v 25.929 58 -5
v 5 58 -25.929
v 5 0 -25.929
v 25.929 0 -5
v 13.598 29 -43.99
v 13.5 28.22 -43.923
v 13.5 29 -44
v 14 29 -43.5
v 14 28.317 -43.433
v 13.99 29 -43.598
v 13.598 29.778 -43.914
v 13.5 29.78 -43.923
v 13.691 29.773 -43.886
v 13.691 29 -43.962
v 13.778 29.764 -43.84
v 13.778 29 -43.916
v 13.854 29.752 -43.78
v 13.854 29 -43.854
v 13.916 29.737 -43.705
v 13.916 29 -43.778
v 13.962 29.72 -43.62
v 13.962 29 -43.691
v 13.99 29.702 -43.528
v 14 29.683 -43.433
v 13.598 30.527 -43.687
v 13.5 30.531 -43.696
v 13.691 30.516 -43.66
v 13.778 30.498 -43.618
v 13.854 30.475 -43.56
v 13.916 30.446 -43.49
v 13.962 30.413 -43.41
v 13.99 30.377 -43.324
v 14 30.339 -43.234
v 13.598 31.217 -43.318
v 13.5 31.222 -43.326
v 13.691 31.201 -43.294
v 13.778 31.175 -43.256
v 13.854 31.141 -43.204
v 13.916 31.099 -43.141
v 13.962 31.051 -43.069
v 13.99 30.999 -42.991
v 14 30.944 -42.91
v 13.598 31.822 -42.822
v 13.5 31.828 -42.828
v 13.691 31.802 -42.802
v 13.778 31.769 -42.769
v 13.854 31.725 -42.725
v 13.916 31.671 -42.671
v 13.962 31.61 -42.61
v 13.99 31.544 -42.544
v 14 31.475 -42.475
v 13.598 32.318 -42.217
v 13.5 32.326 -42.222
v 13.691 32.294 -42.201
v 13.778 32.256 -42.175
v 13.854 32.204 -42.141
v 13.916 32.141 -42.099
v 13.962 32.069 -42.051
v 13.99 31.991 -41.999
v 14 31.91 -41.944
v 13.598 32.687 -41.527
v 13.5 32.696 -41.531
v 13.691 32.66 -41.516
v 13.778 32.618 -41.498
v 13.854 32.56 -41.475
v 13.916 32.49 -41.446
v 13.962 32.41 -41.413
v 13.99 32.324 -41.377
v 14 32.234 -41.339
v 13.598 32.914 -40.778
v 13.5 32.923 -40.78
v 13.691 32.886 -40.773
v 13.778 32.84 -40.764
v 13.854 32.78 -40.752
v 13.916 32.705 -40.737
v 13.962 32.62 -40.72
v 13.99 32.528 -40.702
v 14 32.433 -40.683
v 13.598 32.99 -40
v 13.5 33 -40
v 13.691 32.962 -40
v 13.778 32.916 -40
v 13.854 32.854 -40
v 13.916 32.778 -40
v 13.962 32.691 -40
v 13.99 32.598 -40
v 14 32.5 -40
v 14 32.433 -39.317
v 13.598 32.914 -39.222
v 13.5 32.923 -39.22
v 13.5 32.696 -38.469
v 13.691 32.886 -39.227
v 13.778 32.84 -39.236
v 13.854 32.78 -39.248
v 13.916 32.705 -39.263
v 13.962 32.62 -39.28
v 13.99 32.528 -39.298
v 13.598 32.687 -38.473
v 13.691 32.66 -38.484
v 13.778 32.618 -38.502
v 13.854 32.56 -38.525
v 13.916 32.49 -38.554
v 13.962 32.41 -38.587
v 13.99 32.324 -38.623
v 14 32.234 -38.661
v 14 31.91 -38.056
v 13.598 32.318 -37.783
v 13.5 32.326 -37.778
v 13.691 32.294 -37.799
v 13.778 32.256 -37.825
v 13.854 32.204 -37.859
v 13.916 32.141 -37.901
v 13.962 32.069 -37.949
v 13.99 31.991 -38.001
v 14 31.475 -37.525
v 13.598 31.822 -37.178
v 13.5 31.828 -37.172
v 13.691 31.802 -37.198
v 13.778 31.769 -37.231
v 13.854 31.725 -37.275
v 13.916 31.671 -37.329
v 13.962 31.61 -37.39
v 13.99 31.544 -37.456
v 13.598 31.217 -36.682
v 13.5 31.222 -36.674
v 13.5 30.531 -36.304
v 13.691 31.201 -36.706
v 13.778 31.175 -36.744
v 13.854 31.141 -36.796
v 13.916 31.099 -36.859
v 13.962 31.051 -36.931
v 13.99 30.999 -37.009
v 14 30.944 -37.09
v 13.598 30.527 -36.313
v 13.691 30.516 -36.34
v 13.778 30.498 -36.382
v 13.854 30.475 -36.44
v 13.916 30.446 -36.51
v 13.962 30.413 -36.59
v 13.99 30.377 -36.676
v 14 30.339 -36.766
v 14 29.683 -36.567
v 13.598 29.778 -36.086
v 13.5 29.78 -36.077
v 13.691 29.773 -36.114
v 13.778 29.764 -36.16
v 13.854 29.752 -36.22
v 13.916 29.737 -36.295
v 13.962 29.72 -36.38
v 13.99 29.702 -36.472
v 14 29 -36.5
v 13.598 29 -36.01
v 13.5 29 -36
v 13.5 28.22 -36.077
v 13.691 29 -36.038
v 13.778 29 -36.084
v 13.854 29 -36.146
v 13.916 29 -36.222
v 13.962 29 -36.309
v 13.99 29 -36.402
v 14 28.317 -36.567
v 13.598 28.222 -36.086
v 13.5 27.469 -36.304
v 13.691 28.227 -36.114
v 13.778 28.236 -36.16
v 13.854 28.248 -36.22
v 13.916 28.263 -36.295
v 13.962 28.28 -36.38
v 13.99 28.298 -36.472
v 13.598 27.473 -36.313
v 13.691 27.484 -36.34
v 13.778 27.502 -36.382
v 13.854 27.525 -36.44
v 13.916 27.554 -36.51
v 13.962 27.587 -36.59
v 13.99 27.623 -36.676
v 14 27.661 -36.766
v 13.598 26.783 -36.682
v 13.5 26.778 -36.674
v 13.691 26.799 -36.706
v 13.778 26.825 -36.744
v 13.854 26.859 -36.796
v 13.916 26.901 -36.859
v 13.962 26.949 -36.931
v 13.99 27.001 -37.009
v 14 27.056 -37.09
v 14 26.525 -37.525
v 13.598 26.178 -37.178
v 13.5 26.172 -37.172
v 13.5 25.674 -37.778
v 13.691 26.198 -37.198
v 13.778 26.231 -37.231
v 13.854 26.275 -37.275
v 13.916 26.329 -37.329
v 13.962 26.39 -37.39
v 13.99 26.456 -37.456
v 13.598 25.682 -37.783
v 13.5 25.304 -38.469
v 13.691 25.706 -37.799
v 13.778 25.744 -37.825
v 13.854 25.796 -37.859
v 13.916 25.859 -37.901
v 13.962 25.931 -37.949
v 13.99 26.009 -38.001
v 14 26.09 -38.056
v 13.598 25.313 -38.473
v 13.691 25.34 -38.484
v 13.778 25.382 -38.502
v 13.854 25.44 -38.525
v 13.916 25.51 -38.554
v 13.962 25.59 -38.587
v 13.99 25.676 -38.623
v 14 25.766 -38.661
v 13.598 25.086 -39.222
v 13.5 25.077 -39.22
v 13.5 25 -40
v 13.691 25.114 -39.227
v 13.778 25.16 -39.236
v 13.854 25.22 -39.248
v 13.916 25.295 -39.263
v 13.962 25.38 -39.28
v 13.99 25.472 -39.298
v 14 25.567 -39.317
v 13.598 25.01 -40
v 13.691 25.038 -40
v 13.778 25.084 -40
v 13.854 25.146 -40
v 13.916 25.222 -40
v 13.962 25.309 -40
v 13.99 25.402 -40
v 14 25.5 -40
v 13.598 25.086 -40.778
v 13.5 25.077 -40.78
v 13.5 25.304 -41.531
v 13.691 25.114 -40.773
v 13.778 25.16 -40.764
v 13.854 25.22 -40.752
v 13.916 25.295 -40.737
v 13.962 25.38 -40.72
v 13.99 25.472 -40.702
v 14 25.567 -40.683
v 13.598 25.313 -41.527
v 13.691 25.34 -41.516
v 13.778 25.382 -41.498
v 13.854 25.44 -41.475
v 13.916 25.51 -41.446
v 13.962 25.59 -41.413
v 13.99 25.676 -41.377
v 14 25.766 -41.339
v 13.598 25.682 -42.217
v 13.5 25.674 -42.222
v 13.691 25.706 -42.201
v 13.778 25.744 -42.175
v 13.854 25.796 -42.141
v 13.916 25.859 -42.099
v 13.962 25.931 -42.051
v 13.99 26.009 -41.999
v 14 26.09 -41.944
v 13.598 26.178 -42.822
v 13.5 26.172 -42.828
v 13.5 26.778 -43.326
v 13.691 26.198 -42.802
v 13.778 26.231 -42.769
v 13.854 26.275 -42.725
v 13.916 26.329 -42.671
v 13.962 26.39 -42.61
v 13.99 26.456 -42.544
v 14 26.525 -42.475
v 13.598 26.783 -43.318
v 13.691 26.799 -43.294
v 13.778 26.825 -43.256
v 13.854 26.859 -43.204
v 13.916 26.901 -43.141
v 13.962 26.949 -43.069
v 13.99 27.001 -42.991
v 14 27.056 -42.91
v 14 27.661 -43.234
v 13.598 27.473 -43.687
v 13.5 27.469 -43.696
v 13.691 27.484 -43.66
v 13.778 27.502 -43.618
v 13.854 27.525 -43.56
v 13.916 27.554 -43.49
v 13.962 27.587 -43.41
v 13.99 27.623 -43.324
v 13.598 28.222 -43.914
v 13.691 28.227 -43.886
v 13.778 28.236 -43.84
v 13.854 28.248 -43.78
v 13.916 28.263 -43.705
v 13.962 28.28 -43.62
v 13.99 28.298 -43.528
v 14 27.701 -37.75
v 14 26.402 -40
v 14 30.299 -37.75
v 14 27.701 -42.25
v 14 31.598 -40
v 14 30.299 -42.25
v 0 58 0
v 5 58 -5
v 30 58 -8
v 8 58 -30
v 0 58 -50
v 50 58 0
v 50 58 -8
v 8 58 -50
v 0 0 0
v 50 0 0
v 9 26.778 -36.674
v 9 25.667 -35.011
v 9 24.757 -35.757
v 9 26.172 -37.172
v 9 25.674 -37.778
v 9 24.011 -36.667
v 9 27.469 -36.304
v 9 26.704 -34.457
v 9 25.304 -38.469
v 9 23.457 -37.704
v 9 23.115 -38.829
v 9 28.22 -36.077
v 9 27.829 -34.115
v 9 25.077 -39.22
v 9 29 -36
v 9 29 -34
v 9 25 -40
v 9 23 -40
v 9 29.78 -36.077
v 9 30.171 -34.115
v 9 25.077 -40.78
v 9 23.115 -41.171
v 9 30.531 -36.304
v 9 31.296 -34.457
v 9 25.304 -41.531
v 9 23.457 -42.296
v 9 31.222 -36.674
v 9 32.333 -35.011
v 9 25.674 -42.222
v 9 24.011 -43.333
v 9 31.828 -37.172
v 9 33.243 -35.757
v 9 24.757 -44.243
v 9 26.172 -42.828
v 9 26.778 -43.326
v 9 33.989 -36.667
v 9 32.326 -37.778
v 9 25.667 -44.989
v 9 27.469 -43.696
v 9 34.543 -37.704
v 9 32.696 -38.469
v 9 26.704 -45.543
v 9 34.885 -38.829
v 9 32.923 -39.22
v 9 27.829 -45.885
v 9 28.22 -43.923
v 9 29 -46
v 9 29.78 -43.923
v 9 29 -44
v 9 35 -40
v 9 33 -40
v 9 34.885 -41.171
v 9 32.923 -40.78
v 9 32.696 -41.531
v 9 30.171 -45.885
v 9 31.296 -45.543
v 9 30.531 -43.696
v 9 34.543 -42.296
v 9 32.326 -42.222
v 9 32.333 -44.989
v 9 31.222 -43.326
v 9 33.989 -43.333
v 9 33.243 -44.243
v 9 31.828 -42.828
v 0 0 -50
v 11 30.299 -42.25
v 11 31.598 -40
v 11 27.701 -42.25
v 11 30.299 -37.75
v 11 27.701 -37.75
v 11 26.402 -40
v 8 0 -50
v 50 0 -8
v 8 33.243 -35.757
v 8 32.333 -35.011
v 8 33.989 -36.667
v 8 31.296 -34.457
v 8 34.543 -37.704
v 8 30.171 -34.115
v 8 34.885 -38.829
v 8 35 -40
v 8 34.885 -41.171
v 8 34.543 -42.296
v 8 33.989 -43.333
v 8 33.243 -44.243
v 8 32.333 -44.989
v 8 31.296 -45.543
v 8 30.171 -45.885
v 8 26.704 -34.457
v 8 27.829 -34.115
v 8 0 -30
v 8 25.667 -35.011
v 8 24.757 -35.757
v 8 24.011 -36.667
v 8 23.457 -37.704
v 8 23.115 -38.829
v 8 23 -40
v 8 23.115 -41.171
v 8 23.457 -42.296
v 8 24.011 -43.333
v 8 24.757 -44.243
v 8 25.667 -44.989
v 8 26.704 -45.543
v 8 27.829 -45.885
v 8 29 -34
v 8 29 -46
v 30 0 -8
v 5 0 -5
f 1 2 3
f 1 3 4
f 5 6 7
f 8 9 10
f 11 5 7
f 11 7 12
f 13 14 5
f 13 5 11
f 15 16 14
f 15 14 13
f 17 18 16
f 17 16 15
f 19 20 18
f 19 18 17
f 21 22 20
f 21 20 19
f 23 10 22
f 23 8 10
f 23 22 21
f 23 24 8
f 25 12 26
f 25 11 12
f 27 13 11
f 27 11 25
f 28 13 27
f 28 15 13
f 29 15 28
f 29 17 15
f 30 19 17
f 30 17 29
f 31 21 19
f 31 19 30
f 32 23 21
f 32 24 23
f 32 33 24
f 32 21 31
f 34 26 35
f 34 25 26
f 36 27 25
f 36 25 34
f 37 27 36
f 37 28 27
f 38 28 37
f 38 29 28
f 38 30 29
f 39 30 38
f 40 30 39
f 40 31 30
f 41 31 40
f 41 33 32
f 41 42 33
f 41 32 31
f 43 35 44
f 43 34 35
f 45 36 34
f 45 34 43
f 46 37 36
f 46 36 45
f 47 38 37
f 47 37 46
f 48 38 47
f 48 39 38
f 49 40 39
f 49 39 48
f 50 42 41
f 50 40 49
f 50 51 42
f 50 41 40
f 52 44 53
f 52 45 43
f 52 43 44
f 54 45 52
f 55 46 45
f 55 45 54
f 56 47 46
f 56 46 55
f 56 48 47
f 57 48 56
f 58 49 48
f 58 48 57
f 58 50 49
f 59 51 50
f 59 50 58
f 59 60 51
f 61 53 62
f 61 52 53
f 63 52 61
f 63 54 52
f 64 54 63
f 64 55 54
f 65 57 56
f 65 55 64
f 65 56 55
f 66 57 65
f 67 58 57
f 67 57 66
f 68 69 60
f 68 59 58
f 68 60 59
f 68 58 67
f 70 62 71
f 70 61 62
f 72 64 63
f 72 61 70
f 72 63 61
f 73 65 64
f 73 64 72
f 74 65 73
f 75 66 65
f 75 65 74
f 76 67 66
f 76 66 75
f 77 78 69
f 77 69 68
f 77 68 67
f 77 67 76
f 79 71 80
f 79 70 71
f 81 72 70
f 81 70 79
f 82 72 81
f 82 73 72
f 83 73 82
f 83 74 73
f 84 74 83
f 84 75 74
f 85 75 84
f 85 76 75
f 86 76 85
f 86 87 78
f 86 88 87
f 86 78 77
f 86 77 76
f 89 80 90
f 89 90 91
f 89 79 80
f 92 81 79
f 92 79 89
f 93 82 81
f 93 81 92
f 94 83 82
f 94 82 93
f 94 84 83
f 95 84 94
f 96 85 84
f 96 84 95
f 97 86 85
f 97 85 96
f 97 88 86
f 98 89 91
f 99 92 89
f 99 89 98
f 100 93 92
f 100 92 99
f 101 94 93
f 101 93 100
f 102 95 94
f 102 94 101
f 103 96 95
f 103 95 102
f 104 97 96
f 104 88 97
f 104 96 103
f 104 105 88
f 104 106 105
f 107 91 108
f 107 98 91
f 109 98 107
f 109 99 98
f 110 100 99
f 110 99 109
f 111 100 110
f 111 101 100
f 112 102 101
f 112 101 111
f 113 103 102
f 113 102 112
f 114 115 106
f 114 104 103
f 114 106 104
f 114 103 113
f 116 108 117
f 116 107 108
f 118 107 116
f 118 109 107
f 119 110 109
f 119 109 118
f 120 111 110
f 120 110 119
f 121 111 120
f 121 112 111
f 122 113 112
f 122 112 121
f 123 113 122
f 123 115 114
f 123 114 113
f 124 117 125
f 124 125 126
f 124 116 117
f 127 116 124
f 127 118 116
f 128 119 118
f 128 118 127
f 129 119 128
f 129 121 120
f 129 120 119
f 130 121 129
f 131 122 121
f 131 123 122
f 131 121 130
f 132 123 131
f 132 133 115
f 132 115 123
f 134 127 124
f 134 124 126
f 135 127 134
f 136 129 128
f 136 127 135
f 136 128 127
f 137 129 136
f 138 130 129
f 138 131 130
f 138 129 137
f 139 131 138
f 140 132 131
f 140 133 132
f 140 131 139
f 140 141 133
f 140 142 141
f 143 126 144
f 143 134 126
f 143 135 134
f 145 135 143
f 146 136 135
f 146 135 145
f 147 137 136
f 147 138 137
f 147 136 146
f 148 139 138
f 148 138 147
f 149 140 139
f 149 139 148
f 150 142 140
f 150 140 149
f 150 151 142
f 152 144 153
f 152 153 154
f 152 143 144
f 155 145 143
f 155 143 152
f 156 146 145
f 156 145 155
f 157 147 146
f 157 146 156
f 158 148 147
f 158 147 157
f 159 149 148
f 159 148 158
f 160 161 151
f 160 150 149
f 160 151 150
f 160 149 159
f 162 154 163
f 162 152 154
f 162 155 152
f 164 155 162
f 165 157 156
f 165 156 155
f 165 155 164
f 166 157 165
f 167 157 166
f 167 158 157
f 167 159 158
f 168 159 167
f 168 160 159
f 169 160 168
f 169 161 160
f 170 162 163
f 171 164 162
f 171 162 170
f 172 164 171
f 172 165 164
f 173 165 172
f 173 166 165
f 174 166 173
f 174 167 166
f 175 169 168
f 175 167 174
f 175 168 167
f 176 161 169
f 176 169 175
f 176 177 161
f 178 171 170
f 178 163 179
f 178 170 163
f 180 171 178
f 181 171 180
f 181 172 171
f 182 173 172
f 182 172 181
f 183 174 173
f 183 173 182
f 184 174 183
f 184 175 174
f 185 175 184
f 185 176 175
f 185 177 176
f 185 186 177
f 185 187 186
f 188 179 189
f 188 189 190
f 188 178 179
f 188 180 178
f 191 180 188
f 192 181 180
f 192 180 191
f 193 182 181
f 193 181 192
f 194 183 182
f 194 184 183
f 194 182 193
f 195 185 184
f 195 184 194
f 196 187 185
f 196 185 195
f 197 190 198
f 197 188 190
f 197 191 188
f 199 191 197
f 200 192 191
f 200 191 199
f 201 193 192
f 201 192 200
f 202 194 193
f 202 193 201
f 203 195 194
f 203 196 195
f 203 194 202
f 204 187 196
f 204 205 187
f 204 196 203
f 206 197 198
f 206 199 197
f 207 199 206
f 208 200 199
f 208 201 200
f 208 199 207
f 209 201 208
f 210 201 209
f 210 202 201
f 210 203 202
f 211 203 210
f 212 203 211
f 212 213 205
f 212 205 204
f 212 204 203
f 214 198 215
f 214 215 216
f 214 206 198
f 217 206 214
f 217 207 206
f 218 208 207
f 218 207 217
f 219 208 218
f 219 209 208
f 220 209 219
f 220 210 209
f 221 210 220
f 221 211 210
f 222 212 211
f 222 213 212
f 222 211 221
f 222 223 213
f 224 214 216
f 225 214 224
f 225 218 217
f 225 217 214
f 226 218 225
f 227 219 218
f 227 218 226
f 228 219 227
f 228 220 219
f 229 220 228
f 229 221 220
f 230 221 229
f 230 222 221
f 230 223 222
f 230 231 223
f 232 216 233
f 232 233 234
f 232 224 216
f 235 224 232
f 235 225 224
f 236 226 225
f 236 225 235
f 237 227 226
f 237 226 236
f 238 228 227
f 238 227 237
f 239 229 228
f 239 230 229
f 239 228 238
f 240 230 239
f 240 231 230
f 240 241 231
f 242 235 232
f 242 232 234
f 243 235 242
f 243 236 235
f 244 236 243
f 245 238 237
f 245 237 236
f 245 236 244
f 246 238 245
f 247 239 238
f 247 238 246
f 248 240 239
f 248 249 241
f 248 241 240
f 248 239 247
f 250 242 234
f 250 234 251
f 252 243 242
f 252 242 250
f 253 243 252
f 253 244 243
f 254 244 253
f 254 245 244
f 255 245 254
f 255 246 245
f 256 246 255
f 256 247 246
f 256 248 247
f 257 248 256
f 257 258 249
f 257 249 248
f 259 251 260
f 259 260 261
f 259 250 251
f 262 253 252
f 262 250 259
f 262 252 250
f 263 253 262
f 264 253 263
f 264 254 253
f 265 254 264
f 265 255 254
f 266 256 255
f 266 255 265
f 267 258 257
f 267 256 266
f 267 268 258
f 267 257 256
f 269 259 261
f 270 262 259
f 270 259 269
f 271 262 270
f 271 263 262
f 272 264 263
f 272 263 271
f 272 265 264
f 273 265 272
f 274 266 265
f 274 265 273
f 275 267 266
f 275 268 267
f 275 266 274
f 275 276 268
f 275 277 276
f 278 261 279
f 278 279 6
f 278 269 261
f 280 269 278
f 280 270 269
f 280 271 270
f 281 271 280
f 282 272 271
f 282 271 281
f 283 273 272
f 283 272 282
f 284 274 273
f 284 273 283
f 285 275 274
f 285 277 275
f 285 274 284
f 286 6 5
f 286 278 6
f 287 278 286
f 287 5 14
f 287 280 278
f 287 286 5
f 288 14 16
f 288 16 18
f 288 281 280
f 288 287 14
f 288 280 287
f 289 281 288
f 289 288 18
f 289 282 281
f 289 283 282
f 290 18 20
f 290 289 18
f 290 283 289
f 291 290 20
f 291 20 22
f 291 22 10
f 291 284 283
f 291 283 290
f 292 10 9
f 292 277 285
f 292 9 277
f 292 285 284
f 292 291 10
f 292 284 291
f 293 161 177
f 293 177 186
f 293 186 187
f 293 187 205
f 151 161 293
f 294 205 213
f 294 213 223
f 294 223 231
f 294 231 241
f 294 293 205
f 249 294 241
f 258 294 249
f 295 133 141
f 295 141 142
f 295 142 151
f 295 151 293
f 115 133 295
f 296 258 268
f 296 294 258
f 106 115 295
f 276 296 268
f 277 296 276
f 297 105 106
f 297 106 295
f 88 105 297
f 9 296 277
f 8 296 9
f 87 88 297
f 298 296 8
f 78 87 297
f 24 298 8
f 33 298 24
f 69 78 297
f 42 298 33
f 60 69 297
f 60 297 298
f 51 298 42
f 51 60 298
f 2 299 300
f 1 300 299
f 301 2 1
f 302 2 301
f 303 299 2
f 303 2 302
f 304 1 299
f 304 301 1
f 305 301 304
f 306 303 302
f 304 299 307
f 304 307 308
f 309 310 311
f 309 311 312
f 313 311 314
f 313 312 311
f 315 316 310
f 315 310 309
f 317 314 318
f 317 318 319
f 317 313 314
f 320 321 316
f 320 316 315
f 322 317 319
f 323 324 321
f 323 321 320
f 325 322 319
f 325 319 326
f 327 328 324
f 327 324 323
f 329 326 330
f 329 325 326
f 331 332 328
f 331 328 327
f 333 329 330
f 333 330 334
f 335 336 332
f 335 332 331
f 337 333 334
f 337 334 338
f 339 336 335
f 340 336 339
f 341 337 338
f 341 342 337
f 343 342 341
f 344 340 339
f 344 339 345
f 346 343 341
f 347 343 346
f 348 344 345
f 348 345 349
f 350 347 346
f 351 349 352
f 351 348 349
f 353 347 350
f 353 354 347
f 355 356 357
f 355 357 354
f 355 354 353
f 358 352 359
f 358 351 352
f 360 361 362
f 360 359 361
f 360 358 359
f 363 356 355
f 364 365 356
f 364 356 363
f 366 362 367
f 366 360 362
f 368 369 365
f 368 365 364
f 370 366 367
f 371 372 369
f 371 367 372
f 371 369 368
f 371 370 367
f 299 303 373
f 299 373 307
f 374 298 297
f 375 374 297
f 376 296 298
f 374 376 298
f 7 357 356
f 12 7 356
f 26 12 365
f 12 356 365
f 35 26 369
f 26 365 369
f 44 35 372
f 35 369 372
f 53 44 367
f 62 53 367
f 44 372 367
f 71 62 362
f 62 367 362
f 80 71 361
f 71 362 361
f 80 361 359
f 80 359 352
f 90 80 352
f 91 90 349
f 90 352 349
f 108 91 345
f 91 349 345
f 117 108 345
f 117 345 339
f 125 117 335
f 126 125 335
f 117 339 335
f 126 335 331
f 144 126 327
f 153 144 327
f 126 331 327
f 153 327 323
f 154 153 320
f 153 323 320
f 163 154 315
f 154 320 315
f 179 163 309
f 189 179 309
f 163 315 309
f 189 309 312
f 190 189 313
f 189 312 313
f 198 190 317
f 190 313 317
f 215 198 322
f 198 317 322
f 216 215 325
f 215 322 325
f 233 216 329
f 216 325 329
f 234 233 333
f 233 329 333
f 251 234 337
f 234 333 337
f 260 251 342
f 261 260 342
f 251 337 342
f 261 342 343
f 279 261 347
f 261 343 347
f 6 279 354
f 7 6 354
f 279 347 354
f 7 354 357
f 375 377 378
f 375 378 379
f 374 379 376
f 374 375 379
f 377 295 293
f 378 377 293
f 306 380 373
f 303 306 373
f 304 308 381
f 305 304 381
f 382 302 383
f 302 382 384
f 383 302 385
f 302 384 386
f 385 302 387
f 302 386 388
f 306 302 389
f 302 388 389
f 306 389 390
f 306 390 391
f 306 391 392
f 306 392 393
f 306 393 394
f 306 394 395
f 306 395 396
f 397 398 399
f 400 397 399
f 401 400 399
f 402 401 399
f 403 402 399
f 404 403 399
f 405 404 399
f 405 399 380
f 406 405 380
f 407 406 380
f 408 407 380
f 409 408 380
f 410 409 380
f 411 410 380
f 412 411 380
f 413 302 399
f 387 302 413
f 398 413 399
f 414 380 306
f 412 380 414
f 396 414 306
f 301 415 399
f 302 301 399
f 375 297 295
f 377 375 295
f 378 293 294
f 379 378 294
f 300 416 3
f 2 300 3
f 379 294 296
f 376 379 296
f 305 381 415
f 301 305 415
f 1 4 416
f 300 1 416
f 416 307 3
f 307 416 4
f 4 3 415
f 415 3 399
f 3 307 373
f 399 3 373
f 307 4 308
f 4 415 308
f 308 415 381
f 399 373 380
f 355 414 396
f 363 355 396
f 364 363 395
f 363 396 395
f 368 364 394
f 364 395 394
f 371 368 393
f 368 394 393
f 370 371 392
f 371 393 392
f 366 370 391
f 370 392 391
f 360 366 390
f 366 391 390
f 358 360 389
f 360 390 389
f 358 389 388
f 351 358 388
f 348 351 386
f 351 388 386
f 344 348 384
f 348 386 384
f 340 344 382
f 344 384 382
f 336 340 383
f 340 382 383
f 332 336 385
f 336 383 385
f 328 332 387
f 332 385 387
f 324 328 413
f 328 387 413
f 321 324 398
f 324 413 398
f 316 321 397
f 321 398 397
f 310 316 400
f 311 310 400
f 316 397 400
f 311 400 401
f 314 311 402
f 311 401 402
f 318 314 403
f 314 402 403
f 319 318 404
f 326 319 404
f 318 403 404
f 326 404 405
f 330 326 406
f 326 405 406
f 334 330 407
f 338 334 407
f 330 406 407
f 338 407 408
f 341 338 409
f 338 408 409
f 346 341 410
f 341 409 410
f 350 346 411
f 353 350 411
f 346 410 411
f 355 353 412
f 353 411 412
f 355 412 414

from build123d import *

# Parameters (mm, degrees)
BOSS_EXTRUDE1_DEPTH = 58
SKETCH2_R           = 6
BOSS_EXTRUDE2_DEPTH = 1
SKETCH3_R           = 4
BOSS_EXTRUDE3_DEPTH = 5
CUT_EXTRUDE1_DEPTH  = 3
FILLET1_R           = 0.5


with BuildPart() as part:
    # Sketch1 → Boss-Extrude1 (new body)
    with BuildSketch(Plane(origin=(0, 0, 0), x_dir=(1, 0, 0), z_dir=(0, 1, 0))):
        Polygon((0, 50), (0, 0), (50, 0), (50, 8), (30, 8), (8, 30), (8, 50), align=None)
        Polygon((5, 25.928932188), (25.928932188, 5), (5, 5), align=None, mode=Mode.SUBTRACT)
    extrude(amount=BOSS_EXTRUDE1_DEPTH)

    # Sketch2 → Boss-Extrude2 (add)
    with BuildSketch(Plane(origin=(8, 0, 0), x_dir=(0, 0, -1), z_dir=(1, 0, 0))):
        with Locations((40, 29)):
            Circle(SKETCH2_R)
    extrude(amount=BOSS_EXTRUDE2_DEPTH)

    # Sketch3 → Boss-Extrude3 (add)
    with BuildSketch(Plane(origin=(9, 0, 0), x_dir=(0, 0, -1), z_dir=(1, 0, 0))):
        with Locations((40, 29)):
            Circle(SKETCH3_R)
    extrude(amount=BOSS_EXTRUDE3_DEPTH)

    # Sketch4 → Cut-Extrude1 (cut)
    with BuildSketch(Plane(origin=(14, 0, 0), x_dir=(0, 0, -1), z_dir=(1, 0, 0))):
        Polygon((40, 26.401923789), (42.25, 27.700961894), (42.25, 30.299038106), (40, 31.598076211), (37.75, 30.299038106), (37.75, 27.700961894), align=None)
    extrude(amount=-CUT_EXTRUDE1_DEPTH, mode=Mode.SUBTRACT)

    # Fillet1
    fillet1_edges = [part.edges().sort_by_distance(p)[0] for p in [
        (14, 29, -36),
    ]]
    fillet(fillet1_edges, radius=FILLET1_R)


solid = part.part
